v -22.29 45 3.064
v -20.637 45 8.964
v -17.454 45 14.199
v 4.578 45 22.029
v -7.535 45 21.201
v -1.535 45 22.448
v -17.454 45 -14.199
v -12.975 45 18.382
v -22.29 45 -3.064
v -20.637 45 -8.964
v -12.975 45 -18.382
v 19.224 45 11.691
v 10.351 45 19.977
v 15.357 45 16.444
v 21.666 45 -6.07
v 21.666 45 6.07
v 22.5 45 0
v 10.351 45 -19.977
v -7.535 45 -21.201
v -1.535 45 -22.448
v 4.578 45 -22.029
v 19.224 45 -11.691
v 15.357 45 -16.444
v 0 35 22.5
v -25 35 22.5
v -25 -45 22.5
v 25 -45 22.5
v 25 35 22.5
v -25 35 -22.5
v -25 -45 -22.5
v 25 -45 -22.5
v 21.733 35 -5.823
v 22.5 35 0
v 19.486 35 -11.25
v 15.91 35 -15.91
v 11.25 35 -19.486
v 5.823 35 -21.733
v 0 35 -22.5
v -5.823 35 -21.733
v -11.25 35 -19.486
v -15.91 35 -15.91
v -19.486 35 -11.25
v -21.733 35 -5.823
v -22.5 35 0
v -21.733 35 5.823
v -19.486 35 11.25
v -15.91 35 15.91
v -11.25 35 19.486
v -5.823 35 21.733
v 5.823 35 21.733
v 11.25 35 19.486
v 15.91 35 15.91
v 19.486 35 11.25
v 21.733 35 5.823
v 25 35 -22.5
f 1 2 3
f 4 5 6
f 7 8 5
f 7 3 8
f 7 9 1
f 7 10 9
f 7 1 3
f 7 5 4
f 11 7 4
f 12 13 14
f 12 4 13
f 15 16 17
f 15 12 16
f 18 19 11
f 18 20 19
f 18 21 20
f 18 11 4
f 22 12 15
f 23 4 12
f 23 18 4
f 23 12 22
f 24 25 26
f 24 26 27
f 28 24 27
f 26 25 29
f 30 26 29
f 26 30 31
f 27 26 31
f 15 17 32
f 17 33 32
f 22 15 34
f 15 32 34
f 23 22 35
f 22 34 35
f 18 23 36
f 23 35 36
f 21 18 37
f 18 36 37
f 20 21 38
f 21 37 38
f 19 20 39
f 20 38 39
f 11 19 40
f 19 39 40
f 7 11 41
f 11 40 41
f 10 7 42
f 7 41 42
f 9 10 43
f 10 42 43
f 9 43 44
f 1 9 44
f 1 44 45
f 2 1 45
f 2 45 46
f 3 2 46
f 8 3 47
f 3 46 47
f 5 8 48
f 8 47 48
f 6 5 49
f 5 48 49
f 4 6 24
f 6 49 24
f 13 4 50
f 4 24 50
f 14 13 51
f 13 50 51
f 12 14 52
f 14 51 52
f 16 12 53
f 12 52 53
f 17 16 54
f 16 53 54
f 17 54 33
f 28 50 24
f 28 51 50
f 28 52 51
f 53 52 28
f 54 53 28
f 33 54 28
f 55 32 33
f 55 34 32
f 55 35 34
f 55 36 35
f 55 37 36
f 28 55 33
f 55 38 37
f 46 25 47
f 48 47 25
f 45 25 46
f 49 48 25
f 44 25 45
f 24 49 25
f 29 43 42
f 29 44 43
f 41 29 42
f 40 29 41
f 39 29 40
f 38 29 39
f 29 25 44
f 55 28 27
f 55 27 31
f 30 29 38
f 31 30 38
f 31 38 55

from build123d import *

# Parameters (mm, degrees)
SKETCH1_W           = 50
SKETCH1_H           = 45
BOSS_EXTRUDE1_DEPTH = 45
SKETCH2_OUTSIDE_W   = 74.472
SKETCH2_OUTSIDE_H   = 69.472
SKETCH2_OUTSIDE_R   = 22.5
CUT_EXTRUDE1_DEPTH  = 10


with BuildPart() as part:
    # Sketch1 → Boss-Extrude1 (new body, symmetric)
    with BuildSketch(Plane(origin=(0, 0, 0), x_dir=(1, 0, 0), z_dir=(0, 1, 0))):
        Rectangle(SKETCH1_W, SKETCH1_H)
    extrude(amount=BOSS_EXTRUDE1_DEPTH, both=True)

    # Sketch2 outside → Cut-Extrude1 (cut, symmetric)
    with BuildSketch(Plane(origin=(0, 45, 0), x_dir=(1, 0, 0), z_dir=(0, 1, 0))):
        Rectangle(SKETCH2_OUTSIDE_W, SKETCH2_OUTSIDE_H)
        Circle(SKETCH2_OUTSIDE_R, mode=Mode.SUBTRACT)
    extrude(amount=CUT_EXTRUDE1_DEPTH, both=True, mode=Mode.SUBTRACT)


solid = part.part
